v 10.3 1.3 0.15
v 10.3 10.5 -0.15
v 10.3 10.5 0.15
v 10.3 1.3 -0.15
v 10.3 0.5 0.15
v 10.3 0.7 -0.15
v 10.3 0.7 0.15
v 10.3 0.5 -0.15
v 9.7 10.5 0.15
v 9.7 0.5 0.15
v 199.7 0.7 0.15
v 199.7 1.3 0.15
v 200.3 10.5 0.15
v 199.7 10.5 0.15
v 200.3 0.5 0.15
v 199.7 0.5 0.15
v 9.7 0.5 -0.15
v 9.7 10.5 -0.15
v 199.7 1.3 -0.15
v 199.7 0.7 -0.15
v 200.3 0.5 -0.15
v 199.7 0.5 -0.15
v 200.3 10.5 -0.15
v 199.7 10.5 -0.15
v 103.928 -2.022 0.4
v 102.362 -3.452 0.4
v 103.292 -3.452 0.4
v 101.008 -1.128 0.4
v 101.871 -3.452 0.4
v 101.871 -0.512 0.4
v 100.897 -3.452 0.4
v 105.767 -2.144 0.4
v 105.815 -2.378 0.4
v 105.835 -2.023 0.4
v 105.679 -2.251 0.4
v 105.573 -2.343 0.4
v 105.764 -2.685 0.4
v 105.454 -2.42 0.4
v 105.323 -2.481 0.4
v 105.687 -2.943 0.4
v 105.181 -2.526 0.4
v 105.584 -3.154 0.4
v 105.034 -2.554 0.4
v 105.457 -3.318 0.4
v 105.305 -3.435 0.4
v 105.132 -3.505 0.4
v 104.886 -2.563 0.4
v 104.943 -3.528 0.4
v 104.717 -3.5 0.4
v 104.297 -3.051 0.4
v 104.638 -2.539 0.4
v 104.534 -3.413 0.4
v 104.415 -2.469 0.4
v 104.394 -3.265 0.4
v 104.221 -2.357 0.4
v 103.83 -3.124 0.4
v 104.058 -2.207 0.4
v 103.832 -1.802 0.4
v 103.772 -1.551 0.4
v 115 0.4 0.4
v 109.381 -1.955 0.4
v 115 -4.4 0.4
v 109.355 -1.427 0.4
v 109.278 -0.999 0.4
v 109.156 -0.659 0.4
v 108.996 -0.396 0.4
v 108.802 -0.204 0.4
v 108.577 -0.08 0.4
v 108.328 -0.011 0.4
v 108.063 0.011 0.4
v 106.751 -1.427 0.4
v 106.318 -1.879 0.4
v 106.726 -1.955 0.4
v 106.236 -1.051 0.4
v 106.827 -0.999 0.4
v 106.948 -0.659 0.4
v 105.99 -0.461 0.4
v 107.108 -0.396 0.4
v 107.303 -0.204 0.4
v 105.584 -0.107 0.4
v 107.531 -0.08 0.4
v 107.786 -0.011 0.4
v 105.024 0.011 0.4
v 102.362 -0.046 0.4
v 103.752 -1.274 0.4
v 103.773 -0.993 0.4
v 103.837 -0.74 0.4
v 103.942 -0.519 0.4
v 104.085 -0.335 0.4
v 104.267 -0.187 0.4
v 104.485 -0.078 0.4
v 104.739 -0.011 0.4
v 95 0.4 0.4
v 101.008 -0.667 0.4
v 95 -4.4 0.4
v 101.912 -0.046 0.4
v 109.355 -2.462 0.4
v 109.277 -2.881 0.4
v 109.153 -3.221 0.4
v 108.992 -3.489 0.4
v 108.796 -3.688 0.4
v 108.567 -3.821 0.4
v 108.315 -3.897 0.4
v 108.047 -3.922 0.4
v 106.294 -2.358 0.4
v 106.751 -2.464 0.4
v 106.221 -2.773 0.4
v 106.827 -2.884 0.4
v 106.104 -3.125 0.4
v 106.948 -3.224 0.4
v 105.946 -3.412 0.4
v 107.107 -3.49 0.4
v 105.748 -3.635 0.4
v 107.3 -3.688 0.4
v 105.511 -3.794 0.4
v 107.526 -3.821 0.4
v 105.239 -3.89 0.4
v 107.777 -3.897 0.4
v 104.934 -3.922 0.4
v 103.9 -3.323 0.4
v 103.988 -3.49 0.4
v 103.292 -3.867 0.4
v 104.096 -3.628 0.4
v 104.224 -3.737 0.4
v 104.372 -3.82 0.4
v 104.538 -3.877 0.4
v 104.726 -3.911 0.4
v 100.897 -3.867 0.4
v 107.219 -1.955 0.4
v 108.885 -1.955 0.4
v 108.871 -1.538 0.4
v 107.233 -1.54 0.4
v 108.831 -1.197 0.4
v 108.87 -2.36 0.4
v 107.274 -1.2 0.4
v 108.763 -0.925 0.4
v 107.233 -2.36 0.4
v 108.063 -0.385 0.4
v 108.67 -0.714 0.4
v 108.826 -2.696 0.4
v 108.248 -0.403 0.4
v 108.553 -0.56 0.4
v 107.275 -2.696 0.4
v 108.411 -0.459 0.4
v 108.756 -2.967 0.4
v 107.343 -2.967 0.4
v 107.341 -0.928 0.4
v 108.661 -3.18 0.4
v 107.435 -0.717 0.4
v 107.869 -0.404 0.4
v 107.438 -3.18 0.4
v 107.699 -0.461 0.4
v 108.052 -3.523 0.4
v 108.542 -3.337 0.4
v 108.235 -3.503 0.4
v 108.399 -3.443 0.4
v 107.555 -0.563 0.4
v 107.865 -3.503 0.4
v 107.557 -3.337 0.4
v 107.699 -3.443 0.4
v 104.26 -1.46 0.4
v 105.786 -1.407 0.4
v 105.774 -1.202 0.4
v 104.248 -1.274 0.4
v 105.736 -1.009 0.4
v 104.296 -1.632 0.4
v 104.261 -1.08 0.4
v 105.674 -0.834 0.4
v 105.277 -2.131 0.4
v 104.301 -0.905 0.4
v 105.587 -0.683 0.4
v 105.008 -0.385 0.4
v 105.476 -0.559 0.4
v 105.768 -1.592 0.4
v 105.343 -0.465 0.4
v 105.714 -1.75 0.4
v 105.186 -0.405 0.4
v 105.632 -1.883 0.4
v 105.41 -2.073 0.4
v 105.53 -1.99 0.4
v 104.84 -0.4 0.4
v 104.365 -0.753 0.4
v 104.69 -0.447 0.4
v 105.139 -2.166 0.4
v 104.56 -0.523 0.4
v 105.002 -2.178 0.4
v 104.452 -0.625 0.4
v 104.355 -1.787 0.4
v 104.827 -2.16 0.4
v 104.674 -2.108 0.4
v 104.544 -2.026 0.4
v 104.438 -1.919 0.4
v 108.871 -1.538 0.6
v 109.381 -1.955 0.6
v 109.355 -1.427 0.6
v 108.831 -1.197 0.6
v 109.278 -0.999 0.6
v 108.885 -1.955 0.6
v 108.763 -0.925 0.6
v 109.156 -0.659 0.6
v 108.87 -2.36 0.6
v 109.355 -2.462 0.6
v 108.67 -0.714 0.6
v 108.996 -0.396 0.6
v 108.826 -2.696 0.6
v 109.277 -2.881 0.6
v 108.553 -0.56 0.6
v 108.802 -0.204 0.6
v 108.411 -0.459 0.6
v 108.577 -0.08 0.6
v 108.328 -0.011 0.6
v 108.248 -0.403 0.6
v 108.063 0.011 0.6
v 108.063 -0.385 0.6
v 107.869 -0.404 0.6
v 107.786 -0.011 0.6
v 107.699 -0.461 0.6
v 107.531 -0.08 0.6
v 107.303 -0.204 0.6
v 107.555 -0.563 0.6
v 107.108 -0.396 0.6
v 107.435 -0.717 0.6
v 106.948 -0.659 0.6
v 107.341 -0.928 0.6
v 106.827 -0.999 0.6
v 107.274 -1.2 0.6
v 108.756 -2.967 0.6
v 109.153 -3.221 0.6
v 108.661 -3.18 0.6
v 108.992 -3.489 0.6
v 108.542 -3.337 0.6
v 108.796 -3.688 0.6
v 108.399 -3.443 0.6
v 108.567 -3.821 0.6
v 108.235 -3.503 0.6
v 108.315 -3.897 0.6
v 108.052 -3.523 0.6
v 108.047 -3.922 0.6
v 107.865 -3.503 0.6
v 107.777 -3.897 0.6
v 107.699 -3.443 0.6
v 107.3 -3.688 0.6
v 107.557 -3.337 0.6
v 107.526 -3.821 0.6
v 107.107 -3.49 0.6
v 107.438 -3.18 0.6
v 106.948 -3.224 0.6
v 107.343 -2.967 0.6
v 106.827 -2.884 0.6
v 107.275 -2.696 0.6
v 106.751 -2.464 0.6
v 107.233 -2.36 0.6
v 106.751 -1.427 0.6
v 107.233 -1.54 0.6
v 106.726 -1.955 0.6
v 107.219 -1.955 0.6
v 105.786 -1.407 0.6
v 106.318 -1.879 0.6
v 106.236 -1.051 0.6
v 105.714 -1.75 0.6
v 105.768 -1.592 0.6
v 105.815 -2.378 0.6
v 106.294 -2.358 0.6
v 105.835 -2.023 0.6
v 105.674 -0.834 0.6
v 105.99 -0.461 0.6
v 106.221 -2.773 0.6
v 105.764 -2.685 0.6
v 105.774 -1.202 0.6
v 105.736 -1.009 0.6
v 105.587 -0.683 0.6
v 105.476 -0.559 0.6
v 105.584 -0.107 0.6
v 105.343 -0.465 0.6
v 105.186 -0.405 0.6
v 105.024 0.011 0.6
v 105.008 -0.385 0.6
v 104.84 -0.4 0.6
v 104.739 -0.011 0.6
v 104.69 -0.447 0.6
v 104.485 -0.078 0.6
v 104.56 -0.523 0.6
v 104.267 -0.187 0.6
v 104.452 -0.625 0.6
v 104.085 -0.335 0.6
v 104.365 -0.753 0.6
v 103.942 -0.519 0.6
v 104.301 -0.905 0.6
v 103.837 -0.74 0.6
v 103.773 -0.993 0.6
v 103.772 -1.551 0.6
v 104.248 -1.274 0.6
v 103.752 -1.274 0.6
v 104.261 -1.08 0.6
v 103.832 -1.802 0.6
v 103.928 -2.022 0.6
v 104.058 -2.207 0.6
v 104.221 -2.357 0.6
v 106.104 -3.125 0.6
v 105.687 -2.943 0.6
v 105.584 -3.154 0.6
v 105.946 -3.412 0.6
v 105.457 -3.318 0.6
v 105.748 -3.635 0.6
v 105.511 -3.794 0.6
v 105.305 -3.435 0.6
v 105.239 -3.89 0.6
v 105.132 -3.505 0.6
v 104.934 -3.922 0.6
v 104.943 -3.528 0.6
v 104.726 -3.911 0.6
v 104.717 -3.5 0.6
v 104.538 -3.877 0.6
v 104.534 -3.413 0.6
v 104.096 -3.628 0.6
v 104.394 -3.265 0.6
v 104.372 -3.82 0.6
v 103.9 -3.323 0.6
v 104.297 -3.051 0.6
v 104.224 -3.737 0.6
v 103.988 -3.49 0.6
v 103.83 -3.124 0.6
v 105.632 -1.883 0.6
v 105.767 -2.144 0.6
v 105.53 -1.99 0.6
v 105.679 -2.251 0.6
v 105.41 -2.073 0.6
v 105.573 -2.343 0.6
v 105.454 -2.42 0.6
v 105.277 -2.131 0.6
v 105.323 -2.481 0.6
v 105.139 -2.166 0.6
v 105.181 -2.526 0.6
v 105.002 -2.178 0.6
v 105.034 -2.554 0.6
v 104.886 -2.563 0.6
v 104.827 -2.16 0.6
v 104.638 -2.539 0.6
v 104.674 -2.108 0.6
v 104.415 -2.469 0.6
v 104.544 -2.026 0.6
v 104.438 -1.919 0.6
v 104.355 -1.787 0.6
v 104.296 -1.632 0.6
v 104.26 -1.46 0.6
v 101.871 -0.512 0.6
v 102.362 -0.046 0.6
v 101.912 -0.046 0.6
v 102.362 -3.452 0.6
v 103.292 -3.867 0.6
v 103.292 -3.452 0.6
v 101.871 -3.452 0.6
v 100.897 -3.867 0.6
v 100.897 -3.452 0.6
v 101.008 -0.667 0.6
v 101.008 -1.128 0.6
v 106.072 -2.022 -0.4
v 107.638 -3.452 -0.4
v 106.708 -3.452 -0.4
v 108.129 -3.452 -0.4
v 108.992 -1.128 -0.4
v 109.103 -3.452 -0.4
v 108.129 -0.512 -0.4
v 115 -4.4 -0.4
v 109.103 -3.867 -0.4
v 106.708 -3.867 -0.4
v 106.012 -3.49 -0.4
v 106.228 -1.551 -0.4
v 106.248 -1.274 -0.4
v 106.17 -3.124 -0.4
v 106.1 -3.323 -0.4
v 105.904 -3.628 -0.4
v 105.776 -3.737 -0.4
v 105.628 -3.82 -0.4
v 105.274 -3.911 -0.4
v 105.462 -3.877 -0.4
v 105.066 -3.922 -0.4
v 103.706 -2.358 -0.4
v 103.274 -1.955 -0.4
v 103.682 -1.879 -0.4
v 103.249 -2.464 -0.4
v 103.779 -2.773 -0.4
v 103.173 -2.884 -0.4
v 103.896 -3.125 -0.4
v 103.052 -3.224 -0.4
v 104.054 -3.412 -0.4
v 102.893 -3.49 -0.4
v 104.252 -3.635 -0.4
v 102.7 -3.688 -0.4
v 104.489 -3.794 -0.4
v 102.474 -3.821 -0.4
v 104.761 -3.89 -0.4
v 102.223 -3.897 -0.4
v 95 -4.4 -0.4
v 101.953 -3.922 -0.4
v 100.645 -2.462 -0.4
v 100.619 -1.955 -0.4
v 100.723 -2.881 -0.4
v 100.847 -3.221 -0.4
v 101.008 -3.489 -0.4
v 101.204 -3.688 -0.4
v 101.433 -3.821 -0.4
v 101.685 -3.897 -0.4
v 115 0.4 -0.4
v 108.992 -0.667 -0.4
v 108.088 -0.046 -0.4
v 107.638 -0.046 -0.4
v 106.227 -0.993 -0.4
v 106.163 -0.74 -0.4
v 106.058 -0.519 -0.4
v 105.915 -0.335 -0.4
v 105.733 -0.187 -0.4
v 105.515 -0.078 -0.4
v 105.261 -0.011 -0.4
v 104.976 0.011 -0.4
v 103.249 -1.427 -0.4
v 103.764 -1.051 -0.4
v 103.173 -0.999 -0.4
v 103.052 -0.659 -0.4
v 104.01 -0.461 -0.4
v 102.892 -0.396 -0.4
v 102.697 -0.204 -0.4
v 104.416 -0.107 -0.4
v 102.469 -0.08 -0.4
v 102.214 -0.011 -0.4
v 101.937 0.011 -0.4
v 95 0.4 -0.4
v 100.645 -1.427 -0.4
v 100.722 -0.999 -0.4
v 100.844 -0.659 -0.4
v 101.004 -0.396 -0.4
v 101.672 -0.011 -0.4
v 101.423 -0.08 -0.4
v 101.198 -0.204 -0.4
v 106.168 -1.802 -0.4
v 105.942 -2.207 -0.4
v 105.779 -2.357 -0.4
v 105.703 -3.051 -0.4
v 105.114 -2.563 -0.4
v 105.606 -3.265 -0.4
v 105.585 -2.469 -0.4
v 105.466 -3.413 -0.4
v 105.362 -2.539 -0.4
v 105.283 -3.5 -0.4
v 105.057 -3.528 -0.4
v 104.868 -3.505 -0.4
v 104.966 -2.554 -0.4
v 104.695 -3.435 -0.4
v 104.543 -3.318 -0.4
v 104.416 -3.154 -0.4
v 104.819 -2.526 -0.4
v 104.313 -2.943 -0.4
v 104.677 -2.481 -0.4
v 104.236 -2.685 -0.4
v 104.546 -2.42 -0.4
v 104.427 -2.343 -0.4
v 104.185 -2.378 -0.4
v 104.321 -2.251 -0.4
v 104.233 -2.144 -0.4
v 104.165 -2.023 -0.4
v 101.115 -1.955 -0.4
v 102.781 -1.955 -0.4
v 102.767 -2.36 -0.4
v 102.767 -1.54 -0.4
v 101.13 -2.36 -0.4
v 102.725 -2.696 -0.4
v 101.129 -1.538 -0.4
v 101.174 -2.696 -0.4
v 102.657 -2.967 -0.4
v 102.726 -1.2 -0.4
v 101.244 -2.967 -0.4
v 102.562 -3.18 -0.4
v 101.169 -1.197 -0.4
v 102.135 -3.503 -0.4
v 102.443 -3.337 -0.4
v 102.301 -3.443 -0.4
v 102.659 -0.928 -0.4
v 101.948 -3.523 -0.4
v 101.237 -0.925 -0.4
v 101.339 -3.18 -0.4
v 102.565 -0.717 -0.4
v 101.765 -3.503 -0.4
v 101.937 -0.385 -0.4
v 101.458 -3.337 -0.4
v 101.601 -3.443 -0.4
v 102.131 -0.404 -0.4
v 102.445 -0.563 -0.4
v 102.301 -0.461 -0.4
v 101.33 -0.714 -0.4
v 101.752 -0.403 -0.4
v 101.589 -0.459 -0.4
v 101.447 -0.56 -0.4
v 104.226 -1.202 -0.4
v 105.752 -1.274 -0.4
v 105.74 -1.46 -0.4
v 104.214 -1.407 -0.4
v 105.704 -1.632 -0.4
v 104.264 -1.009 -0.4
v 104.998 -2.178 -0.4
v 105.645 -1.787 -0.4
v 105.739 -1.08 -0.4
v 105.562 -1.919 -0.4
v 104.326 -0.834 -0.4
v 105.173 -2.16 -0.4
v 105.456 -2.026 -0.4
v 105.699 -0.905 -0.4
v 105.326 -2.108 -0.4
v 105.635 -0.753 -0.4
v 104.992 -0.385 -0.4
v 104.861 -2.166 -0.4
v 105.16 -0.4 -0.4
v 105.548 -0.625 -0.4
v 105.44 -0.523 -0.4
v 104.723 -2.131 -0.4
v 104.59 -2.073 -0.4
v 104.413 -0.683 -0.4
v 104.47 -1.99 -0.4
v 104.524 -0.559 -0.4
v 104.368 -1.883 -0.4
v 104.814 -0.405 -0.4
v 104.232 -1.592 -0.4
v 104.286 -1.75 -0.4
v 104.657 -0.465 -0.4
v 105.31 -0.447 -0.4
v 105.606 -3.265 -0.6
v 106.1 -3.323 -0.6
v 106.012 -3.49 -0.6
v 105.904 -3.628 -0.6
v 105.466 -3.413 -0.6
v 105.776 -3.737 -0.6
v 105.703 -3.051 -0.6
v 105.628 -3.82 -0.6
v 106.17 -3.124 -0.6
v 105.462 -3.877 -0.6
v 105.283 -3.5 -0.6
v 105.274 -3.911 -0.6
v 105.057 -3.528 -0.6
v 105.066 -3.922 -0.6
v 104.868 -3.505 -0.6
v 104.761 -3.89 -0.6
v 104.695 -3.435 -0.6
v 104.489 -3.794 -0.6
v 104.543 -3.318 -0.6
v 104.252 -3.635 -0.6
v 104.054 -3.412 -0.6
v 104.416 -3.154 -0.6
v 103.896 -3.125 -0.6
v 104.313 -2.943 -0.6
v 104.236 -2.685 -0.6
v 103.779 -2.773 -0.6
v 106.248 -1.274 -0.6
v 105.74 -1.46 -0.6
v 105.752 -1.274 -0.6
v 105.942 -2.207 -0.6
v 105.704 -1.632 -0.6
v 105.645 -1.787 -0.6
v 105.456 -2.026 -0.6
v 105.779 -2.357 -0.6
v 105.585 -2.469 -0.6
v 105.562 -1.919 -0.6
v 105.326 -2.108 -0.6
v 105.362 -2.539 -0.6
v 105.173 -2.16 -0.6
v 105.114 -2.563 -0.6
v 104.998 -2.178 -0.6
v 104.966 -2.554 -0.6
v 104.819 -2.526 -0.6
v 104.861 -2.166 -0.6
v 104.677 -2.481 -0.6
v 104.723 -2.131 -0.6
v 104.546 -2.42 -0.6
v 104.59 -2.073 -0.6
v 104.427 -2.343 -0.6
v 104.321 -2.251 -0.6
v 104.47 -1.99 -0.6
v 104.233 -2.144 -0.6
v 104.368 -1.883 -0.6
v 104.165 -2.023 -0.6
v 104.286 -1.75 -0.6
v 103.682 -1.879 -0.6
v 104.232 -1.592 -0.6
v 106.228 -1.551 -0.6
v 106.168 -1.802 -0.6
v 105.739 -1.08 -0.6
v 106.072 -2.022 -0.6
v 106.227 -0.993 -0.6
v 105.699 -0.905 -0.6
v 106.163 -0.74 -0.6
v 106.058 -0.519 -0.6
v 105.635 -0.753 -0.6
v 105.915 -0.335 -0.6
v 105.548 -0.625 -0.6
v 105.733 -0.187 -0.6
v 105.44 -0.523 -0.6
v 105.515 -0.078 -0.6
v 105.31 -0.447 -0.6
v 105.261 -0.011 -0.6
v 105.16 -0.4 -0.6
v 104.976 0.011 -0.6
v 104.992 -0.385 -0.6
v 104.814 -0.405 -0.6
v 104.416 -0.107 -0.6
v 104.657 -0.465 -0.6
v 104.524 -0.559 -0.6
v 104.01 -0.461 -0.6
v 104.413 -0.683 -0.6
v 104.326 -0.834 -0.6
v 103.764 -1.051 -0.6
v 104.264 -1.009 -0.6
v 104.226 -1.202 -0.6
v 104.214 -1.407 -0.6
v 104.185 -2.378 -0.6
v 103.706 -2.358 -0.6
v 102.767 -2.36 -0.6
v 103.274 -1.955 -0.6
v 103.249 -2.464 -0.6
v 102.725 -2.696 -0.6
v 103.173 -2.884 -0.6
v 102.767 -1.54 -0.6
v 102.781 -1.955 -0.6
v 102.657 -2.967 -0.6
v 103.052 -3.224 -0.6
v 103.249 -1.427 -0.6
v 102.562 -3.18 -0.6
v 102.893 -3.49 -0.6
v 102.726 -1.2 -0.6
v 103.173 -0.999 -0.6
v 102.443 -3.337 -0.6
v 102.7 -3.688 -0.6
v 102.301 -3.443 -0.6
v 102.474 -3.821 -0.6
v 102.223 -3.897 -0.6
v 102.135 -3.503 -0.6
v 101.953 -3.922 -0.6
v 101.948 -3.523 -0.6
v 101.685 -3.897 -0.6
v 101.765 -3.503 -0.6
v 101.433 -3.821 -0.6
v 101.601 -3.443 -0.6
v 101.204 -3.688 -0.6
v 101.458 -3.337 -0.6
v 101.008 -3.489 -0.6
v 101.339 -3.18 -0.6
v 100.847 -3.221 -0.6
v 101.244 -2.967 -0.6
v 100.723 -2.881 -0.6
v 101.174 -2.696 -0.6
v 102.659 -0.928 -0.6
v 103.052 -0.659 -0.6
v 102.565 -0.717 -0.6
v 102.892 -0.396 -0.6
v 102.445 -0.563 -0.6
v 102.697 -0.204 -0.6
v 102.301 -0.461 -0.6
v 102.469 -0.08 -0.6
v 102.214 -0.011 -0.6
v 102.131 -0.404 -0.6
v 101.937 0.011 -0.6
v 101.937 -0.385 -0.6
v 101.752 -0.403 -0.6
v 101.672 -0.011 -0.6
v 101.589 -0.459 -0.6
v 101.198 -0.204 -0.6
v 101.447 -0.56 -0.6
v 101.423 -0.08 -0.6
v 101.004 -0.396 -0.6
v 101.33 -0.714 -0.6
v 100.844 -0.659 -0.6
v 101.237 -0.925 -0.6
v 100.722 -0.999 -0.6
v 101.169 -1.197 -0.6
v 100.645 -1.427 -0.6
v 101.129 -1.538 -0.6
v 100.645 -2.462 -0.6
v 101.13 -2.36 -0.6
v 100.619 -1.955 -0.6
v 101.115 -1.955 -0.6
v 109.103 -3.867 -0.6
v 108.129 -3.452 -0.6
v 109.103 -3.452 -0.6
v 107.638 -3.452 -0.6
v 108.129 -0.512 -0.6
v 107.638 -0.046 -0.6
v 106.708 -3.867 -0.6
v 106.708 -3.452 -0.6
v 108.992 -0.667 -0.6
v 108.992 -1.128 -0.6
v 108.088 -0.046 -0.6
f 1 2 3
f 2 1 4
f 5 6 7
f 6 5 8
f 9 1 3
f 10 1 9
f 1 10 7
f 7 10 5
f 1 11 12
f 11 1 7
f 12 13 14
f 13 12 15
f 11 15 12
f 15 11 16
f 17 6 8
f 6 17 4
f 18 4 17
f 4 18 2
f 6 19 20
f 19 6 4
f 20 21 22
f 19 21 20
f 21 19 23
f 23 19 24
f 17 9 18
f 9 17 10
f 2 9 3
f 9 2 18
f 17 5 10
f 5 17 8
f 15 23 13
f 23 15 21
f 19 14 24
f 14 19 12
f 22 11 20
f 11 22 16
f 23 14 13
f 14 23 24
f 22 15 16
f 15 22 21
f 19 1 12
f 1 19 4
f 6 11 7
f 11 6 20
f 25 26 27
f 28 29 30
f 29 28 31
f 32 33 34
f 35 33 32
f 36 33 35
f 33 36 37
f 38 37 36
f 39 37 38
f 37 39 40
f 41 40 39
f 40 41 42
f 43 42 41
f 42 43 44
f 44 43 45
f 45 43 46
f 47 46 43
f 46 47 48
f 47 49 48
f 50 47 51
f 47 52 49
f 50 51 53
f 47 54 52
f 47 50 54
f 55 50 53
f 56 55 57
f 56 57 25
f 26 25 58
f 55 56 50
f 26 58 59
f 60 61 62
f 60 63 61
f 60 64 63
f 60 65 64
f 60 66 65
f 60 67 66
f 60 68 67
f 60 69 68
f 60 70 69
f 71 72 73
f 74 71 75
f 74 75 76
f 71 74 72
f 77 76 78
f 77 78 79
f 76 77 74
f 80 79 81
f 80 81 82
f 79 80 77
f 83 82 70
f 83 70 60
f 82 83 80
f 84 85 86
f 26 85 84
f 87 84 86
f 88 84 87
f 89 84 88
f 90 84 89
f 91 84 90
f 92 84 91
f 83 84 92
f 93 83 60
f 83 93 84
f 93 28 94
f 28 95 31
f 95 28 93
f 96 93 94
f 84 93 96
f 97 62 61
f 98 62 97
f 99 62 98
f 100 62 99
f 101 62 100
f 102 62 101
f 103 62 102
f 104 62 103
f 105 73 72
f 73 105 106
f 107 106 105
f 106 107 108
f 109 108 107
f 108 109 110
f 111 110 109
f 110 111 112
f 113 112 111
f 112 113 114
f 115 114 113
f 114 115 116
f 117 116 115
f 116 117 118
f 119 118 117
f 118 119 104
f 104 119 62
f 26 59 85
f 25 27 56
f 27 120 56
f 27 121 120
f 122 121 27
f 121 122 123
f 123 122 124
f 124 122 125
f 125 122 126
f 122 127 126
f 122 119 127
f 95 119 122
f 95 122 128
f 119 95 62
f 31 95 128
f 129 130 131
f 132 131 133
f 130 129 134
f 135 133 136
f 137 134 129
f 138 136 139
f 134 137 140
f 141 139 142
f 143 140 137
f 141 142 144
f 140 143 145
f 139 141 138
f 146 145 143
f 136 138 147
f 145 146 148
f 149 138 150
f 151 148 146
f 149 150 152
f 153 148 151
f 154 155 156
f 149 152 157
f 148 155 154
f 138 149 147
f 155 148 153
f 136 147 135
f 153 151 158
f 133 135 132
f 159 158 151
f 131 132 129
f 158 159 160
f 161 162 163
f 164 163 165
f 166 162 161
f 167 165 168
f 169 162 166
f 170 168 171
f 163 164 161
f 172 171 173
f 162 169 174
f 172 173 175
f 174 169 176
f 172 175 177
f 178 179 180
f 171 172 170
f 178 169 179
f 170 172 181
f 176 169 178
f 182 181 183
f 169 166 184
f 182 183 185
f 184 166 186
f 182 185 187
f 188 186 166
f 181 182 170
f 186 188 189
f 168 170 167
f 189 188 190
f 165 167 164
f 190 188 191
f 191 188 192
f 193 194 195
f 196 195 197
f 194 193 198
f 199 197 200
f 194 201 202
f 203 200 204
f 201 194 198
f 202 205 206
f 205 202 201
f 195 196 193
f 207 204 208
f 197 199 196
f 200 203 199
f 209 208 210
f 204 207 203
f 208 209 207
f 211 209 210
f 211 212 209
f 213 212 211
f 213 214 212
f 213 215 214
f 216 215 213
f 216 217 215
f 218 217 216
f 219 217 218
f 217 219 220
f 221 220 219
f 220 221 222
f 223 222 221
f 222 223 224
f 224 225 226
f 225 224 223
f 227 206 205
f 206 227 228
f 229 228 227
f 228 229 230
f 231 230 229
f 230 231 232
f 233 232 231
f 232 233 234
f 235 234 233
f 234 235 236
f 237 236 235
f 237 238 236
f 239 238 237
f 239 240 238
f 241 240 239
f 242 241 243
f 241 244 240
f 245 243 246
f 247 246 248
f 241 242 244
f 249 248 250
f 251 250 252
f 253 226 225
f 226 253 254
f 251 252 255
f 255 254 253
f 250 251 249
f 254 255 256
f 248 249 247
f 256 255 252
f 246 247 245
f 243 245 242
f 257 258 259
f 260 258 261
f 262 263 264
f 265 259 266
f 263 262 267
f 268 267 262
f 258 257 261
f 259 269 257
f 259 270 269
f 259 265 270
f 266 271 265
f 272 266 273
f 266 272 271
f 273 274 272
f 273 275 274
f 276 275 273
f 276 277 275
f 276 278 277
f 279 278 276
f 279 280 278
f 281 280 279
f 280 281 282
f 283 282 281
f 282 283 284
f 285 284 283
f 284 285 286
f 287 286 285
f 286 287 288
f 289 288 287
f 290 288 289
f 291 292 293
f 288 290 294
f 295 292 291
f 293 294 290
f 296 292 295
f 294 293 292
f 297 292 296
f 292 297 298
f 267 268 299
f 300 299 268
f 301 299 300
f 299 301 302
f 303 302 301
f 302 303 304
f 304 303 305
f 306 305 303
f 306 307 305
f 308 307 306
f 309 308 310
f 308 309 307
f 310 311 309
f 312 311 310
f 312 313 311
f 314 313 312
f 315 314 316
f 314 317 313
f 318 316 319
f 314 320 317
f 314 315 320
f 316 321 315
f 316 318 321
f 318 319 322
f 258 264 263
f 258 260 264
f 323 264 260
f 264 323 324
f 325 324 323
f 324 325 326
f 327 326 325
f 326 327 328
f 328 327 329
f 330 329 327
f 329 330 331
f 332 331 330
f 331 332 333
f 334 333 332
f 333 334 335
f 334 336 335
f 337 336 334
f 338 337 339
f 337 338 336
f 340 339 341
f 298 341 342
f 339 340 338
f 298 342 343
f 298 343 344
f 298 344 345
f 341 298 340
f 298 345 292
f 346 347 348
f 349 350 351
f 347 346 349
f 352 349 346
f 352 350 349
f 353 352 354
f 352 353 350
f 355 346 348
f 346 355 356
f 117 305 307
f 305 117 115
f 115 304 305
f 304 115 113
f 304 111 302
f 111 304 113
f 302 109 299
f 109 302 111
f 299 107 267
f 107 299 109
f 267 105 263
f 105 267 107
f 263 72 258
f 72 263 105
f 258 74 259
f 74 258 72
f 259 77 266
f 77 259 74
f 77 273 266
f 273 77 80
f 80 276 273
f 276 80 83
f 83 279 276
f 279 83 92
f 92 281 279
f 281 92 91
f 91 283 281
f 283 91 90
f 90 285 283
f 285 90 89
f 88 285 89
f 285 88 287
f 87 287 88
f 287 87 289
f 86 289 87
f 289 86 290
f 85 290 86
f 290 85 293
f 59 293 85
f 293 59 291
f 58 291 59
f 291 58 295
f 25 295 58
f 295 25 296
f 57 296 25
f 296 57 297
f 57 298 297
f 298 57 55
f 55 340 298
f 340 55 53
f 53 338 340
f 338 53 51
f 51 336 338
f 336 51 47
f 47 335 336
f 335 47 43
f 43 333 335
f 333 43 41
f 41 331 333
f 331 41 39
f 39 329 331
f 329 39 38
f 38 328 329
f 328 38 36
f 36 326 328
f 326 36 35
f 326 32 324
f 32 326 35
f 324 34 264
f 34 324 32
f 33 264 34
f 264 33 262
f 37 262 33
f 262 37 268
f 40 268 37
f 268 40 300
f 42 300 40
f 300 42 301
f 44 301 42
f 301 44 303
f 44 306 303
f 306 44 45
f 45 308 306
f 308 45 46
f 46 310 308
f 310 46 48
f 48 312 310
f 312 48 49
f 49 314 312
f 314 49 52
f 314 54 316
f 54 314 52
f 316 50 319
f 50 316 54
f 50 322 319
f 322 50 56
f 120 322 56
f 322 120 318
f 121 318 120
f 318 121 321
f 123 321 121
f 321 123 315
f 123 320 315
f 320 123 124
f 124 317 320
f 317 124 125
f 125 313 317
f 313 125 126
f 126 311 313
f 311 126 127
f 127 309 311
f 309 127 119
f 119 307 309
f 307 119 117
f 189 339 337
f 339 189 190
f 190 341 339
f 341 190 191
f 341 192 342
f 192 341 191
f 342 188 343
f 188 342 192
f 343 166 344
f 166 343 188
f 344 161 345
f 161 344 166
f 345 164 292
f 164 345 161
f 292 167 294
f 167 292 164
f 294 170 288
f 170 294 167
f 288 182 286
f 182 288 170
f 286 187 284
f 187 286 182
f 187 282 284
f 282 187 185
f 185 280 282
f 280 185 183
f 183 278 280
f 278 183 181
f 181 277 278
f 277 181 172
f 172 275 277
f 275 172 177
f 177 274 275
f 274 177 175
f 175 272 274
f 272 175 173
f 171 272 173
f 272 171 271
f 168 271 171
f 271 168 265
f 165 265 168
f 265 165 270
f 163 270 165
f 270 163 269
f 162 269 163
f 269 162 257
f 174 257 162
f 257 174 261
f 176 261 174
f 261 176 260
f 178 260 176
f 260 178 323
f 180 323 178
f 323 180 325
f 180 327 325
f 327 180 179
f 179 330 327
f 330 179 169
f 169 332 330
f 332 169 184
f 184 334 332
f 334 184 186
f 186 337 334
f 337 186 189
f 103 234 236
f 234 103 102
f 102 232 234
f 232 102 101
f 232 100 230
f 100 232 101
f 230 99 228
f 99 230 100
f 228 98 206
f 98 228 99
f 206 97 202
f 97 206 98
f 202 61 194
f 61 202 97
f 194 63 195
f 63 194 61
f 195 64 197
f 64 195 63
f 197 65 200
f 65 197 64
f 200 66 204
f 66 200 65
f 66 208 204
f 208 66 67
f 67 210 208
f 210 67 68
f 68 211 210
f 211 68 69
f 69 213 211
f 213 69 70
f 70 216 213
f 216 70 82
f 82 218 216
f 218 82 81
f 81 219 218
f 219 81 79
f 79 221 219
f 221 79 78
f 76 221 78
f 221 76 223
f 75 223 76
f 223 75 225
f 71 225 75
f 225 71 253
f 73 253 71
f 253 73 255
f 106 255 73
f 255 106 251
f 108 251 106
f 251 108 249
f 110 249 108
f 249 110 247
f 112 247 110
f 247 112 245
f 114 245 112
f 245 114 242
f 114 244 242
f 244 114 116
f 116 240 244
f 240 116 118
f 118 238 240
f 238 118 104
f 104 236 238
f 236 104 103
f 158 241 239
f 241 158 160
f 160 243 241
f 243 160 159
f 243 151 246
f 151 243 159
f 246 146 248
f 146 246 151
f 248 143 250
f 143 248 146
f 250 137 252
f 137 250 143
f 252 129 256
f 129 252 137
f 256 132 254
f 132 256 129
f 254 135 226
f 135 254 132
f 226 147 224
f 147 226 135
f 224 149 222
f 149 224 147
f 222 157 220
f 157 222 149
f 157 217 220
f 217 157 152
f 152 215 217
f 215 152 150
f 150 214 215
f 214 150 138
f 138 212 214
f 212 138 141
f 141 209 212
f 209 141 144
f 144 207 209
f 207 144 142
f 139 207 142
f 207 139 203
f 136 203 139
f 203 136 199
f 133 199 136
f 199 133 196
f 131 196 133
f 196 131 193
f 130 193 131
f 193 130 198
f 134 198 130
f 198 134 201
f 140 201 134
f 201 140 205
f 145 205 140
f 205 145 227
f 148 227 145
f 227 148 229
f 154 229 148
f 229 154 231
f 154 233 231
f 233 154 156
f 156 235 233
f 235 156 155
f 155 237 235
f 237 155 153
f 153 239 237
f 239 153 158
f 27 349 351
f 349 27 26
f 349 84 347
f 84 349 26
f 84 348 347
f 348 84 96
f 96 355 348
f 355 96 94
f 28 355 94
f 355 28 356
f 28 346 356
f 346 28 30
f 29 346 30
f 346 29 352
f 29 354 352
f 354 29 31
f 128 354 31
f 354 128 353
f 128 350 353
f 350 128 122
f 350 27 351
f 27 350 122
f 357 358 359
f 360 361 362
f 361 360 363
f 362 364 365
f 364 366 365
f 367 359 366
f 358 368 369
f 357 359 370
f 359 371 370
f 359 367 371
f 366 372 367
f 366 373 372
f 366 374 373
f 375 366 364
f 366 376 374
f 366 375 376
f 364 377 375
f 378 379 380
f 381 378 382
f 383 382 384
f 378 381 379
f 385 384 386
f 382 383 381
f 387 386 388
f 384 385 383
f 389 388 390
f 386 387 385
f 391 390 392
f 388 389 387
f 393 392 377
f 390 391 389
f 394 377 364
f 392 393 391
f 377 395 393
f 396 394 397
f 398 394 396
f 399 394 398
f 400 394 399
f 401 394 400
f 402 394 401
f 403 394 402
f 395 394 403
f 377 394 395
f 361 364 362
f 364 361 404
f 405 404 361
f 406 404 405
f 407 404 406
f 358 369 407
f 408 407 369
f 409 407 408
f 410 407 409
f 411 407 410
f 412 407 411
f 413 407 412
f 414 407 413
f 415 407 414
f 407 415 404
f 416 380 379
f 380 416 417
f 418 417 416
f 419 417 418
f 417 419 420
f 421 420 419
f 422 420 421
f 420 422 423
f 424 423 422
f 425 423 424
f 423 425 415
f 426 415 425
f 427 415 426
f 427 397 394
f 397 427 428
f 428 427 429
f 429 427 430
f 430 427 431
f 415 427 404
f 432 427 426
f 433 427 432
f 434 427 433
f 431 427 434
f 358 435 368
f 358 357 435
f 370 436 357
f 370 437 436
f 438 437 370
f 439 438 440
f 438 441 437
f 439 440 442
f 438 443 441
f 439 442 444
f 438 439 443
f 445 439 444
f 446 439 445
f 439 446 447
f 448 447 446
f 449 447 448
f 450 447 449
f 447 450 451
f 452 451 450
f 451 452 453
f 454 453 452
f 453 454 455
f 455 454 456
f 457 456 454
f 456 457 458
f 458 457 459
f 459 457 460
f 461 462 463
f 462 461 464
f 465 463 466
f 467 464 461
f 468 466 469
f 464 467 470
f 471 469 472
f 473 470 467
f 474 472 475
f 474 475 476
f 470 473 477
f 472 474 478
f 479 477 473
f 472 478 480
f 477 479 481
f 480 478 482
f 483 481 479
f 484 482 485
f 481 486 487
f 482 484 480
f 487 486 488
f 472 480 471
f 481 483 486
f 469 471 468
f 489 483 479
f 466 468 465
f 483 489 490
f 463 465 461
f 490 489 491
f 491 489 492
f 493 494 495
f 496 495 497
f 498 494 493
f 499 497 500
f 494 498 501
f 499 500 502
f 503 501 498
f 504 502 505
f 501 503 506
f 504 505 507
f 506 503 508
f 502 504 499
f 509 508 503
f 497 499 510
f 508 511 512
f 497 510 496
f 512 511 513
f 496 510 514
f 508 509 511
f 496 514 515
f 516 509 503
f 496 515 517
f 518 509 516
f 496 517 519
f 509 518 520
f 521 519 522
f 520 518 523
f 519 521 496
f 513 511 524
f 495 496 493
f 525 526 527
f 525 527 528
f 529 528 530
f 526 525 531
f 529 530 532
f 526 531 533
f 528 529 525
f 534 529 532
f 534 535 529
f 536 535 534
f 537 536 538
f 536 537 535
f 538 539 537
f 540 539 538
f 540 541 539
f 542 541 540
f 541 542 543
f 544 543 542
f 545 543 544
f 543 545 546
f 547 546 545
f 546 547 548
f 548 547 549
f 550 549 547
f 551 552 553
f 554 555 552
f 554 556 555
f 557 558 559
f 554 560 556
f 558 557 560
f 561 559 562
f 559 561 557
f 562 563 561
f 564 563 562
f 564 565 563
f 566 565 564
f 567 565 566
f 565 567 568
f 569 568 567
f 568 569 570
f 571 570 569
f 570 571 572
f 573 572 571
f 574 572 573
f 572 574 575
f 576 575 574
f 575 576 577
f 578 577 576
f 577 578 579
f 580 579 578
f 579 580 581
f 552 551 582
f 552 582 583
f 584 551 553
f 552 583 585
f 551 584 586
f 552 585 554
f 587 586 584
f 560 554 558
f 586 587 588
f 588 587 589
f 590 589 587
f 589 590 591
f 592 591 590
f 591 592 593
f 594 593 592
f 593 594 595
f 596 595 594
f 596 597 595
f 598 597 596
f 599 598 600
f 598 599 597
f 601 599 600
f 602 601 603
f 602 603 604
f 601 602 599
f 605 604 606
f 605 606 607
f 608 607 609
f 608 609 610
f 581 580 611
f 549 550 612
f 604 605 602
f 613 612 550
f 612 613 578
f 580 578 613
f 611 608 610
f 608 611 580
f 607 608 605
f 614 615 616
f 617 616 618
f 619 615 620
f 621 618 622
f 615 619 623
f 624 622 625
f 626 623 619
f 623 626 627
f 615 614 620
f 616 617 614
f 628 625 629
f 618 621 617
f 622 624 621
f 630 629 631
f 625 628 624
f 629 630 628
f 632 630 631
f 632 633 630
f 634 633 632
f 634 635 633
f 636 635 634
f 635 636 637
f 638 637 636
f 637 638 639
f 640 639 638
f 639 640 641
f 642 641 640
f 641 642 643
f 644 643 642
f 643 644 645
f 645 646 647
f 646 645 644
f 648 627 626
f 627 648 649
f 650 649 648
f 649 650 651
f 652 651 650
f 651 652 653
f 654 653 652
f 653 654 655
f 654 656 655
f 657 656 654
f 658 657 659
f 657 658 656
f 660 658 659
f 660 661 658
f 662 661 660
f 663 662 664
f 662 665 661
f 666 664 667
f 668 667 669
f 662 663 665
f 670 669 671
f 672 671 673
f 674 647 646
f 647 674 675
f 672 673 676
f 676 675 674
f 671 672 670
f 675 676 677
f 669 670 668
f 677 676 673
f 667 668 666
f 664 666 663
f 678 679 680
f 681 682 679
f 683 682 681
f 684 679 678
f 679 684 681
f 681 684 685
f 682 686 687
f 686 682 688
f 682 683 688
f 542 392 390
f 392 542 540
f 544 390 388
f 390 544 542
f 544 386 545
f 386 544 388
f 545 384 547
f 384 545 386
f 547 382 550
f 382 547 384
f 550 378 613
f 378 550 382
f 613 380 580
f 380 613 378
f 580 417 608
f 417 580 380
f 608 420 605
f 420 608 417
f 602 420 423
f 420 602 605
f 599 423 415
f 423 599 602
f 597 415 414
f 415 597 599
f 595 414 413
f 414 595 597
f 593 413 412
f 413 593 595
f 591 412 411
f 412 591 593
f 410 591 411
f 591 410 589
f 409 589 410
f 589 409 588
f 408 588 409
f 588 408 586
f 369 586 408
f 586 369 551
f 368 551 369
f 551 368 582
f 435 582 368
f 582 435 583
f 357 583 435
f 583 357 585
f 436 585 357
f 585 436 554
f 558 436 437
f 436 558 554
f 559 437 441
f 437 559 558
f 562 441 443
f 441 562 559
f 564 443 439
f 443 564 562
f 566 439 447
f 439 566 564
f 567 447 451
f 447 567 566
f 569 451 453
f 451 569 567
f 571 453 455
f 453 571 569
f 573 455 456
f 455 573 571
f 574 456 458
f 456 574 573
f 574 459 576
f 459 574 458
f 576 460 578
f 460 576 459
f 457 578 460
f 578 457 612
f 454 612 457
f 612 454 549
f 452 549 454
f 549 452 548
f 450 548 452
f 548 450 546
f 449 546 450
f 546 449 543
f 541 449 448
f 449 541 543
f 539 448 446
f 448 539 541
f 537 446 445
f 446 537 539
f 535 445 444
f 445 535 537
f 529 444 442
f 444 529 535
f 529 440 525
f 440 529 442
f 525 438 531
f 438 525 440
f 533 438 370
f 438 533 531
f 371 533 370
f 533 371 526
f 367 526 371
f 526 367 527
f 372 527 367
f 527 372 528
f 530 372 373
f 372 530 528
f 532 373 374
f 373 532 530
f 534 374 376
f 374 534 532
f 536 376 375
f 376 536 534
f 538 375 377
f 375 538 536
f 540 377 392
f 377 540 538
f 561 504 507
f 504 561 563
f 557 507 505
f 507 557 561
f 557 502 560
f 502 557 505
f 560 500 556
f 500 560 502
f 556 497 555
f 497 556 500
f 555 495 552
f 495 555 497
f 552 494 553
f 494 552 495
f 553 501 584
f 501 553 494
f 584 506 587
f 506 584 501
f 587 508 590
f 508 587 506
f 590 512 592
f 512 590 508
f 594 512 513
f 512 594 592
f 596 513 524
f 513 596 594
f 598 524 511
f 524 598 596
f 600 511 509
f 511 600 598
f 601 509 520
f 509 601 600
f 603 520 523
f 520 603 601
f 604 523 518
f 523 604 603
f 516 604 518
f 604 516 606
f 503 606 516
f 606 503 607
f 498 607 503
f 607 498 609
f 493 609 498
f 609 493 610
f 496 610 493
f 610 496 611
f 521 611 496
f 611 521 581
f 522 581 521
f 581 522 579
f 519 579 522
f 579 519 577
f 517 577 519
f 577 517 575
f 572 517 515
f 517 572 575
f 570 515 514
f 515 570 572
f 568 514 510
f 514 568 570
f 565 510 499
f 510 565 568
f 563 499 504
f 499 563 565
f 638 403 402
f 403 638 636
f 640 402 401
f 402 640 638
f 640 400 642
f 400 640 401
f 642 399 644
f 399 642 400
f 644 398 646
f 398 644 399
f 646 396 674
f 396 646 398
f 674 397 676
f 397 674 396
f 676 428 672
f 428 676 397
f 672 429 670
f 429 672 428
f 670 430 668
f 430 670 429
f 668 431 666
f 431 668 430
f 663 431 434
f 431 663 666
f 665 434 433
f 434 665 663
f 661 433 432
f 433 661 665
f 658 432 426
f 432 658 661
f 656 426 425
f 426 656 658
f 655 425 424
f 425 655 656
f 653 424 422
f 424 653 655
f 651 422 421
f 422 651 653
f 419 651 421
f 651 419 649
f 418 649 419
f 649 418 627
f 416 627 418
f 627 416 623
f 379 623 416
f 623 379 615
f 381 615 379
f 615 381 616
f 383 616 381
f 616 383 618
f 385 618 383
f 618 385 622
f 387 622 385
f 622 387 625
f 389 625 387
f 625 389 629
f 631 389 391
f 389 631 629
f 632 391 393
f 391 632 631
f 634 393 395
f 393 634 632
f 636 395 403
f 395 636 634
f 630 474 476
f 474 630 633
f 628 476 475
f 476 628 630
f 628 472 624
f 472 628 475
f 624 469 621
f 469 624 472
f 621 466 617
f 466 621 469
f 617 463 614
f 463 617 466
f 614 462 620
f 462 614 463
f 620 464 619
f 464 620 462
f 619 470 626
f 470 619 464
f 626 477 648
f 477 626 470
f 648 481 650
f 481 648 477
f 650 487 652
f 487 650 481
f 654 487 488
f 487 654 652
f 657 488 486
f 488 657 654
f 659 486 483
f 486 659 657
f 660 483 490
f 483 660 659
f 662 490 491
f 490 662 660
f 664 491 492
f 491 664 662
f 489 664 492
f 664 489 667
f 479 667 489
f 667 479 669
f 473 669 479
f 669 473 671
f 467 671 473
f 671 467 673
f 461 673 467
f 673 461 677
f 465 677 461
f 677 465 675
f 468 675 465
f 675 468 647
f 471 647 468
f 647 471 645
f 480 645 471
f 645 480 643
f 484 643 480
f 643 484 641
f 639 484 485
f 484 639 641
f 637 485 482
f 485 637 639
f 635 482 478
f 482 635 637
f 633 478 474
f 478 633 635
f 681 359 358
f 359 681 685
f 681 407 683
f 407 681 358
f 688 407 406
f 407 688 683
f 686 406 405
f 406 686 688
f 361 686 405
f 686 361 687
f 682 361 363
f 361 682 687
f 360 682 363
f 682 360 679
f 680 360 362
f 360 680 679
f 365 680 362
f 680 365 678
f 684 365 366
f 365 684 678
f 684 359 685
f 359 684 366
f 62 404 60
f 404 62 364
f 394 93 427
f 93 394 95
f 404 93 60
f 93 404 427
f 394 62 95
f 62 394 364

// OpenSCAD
module hdim(
  x1 = 10, 
  x2 = 200, 
  y = 10, 
  dimline_lenght = 9.0,
  scaling = 1.0) 
{
    dimline_overlap = scaling * 0.5;
    dimline_width = scaling * 0.6;
    text_size = scaling * 4;
    tmp = 2*dimline_overlap+text_size/2;
    scaled_dl_len = scaling * dimline_lenght;
    text_pos = scaled_dl_len>0 ? tmp : -tmp; 
    dimline_abs = scaled_dl_len>0 ? scaled_dl_len : -scaled_dl_len;
    
    color([146/255, 154/255, 255/255, 0.7])
    {
        translate([x1,y-scaled_dl_len/2,0]) 
            cube([dimline_width, 
                dimline_abs + 2*dimline_overlap,
                dimline_width/2], 
                center=true);
                
        translate([x2,y-scaled_dl_len/2,0]) 
            cube([dimline_width, 
                dimline_abs + 2*dimline_overlap,
                dimline_width/2], 
                center=true);

        translate([(x1+x2)/2,y-scaled_dl_len,0]) 
            cube([x2-x1, 
                dimline_width,
                dimline_width/2], 
                center=true);
    }
        
    translate([(x1+x2)/2,y-scaled_dl_len-text_pos,0]) 
    {
        color([106/255, 134/255, 245/255])
        cube([text_size * 5, 1.2*text_size, 0.8*scaling], center=true);
        
        color([1,1,1,1])
        {
            translate([0,0,0.4*scaling])
            linear_extrude(0.2*scaling)
            text(str(0.1*round((x2-x1)*10)), size = text_size, 
                halign = "center",valign = "center");
            translate([0,0,-0.4*scaling])
            rotate([0,180,0])
            linear_extrude(0.2*scaling)
            text(str(0.1*round((x2-x1)*10)), size = text_size, 
                halign = "center",valign = "center");
        }
    }
}

hdim();
